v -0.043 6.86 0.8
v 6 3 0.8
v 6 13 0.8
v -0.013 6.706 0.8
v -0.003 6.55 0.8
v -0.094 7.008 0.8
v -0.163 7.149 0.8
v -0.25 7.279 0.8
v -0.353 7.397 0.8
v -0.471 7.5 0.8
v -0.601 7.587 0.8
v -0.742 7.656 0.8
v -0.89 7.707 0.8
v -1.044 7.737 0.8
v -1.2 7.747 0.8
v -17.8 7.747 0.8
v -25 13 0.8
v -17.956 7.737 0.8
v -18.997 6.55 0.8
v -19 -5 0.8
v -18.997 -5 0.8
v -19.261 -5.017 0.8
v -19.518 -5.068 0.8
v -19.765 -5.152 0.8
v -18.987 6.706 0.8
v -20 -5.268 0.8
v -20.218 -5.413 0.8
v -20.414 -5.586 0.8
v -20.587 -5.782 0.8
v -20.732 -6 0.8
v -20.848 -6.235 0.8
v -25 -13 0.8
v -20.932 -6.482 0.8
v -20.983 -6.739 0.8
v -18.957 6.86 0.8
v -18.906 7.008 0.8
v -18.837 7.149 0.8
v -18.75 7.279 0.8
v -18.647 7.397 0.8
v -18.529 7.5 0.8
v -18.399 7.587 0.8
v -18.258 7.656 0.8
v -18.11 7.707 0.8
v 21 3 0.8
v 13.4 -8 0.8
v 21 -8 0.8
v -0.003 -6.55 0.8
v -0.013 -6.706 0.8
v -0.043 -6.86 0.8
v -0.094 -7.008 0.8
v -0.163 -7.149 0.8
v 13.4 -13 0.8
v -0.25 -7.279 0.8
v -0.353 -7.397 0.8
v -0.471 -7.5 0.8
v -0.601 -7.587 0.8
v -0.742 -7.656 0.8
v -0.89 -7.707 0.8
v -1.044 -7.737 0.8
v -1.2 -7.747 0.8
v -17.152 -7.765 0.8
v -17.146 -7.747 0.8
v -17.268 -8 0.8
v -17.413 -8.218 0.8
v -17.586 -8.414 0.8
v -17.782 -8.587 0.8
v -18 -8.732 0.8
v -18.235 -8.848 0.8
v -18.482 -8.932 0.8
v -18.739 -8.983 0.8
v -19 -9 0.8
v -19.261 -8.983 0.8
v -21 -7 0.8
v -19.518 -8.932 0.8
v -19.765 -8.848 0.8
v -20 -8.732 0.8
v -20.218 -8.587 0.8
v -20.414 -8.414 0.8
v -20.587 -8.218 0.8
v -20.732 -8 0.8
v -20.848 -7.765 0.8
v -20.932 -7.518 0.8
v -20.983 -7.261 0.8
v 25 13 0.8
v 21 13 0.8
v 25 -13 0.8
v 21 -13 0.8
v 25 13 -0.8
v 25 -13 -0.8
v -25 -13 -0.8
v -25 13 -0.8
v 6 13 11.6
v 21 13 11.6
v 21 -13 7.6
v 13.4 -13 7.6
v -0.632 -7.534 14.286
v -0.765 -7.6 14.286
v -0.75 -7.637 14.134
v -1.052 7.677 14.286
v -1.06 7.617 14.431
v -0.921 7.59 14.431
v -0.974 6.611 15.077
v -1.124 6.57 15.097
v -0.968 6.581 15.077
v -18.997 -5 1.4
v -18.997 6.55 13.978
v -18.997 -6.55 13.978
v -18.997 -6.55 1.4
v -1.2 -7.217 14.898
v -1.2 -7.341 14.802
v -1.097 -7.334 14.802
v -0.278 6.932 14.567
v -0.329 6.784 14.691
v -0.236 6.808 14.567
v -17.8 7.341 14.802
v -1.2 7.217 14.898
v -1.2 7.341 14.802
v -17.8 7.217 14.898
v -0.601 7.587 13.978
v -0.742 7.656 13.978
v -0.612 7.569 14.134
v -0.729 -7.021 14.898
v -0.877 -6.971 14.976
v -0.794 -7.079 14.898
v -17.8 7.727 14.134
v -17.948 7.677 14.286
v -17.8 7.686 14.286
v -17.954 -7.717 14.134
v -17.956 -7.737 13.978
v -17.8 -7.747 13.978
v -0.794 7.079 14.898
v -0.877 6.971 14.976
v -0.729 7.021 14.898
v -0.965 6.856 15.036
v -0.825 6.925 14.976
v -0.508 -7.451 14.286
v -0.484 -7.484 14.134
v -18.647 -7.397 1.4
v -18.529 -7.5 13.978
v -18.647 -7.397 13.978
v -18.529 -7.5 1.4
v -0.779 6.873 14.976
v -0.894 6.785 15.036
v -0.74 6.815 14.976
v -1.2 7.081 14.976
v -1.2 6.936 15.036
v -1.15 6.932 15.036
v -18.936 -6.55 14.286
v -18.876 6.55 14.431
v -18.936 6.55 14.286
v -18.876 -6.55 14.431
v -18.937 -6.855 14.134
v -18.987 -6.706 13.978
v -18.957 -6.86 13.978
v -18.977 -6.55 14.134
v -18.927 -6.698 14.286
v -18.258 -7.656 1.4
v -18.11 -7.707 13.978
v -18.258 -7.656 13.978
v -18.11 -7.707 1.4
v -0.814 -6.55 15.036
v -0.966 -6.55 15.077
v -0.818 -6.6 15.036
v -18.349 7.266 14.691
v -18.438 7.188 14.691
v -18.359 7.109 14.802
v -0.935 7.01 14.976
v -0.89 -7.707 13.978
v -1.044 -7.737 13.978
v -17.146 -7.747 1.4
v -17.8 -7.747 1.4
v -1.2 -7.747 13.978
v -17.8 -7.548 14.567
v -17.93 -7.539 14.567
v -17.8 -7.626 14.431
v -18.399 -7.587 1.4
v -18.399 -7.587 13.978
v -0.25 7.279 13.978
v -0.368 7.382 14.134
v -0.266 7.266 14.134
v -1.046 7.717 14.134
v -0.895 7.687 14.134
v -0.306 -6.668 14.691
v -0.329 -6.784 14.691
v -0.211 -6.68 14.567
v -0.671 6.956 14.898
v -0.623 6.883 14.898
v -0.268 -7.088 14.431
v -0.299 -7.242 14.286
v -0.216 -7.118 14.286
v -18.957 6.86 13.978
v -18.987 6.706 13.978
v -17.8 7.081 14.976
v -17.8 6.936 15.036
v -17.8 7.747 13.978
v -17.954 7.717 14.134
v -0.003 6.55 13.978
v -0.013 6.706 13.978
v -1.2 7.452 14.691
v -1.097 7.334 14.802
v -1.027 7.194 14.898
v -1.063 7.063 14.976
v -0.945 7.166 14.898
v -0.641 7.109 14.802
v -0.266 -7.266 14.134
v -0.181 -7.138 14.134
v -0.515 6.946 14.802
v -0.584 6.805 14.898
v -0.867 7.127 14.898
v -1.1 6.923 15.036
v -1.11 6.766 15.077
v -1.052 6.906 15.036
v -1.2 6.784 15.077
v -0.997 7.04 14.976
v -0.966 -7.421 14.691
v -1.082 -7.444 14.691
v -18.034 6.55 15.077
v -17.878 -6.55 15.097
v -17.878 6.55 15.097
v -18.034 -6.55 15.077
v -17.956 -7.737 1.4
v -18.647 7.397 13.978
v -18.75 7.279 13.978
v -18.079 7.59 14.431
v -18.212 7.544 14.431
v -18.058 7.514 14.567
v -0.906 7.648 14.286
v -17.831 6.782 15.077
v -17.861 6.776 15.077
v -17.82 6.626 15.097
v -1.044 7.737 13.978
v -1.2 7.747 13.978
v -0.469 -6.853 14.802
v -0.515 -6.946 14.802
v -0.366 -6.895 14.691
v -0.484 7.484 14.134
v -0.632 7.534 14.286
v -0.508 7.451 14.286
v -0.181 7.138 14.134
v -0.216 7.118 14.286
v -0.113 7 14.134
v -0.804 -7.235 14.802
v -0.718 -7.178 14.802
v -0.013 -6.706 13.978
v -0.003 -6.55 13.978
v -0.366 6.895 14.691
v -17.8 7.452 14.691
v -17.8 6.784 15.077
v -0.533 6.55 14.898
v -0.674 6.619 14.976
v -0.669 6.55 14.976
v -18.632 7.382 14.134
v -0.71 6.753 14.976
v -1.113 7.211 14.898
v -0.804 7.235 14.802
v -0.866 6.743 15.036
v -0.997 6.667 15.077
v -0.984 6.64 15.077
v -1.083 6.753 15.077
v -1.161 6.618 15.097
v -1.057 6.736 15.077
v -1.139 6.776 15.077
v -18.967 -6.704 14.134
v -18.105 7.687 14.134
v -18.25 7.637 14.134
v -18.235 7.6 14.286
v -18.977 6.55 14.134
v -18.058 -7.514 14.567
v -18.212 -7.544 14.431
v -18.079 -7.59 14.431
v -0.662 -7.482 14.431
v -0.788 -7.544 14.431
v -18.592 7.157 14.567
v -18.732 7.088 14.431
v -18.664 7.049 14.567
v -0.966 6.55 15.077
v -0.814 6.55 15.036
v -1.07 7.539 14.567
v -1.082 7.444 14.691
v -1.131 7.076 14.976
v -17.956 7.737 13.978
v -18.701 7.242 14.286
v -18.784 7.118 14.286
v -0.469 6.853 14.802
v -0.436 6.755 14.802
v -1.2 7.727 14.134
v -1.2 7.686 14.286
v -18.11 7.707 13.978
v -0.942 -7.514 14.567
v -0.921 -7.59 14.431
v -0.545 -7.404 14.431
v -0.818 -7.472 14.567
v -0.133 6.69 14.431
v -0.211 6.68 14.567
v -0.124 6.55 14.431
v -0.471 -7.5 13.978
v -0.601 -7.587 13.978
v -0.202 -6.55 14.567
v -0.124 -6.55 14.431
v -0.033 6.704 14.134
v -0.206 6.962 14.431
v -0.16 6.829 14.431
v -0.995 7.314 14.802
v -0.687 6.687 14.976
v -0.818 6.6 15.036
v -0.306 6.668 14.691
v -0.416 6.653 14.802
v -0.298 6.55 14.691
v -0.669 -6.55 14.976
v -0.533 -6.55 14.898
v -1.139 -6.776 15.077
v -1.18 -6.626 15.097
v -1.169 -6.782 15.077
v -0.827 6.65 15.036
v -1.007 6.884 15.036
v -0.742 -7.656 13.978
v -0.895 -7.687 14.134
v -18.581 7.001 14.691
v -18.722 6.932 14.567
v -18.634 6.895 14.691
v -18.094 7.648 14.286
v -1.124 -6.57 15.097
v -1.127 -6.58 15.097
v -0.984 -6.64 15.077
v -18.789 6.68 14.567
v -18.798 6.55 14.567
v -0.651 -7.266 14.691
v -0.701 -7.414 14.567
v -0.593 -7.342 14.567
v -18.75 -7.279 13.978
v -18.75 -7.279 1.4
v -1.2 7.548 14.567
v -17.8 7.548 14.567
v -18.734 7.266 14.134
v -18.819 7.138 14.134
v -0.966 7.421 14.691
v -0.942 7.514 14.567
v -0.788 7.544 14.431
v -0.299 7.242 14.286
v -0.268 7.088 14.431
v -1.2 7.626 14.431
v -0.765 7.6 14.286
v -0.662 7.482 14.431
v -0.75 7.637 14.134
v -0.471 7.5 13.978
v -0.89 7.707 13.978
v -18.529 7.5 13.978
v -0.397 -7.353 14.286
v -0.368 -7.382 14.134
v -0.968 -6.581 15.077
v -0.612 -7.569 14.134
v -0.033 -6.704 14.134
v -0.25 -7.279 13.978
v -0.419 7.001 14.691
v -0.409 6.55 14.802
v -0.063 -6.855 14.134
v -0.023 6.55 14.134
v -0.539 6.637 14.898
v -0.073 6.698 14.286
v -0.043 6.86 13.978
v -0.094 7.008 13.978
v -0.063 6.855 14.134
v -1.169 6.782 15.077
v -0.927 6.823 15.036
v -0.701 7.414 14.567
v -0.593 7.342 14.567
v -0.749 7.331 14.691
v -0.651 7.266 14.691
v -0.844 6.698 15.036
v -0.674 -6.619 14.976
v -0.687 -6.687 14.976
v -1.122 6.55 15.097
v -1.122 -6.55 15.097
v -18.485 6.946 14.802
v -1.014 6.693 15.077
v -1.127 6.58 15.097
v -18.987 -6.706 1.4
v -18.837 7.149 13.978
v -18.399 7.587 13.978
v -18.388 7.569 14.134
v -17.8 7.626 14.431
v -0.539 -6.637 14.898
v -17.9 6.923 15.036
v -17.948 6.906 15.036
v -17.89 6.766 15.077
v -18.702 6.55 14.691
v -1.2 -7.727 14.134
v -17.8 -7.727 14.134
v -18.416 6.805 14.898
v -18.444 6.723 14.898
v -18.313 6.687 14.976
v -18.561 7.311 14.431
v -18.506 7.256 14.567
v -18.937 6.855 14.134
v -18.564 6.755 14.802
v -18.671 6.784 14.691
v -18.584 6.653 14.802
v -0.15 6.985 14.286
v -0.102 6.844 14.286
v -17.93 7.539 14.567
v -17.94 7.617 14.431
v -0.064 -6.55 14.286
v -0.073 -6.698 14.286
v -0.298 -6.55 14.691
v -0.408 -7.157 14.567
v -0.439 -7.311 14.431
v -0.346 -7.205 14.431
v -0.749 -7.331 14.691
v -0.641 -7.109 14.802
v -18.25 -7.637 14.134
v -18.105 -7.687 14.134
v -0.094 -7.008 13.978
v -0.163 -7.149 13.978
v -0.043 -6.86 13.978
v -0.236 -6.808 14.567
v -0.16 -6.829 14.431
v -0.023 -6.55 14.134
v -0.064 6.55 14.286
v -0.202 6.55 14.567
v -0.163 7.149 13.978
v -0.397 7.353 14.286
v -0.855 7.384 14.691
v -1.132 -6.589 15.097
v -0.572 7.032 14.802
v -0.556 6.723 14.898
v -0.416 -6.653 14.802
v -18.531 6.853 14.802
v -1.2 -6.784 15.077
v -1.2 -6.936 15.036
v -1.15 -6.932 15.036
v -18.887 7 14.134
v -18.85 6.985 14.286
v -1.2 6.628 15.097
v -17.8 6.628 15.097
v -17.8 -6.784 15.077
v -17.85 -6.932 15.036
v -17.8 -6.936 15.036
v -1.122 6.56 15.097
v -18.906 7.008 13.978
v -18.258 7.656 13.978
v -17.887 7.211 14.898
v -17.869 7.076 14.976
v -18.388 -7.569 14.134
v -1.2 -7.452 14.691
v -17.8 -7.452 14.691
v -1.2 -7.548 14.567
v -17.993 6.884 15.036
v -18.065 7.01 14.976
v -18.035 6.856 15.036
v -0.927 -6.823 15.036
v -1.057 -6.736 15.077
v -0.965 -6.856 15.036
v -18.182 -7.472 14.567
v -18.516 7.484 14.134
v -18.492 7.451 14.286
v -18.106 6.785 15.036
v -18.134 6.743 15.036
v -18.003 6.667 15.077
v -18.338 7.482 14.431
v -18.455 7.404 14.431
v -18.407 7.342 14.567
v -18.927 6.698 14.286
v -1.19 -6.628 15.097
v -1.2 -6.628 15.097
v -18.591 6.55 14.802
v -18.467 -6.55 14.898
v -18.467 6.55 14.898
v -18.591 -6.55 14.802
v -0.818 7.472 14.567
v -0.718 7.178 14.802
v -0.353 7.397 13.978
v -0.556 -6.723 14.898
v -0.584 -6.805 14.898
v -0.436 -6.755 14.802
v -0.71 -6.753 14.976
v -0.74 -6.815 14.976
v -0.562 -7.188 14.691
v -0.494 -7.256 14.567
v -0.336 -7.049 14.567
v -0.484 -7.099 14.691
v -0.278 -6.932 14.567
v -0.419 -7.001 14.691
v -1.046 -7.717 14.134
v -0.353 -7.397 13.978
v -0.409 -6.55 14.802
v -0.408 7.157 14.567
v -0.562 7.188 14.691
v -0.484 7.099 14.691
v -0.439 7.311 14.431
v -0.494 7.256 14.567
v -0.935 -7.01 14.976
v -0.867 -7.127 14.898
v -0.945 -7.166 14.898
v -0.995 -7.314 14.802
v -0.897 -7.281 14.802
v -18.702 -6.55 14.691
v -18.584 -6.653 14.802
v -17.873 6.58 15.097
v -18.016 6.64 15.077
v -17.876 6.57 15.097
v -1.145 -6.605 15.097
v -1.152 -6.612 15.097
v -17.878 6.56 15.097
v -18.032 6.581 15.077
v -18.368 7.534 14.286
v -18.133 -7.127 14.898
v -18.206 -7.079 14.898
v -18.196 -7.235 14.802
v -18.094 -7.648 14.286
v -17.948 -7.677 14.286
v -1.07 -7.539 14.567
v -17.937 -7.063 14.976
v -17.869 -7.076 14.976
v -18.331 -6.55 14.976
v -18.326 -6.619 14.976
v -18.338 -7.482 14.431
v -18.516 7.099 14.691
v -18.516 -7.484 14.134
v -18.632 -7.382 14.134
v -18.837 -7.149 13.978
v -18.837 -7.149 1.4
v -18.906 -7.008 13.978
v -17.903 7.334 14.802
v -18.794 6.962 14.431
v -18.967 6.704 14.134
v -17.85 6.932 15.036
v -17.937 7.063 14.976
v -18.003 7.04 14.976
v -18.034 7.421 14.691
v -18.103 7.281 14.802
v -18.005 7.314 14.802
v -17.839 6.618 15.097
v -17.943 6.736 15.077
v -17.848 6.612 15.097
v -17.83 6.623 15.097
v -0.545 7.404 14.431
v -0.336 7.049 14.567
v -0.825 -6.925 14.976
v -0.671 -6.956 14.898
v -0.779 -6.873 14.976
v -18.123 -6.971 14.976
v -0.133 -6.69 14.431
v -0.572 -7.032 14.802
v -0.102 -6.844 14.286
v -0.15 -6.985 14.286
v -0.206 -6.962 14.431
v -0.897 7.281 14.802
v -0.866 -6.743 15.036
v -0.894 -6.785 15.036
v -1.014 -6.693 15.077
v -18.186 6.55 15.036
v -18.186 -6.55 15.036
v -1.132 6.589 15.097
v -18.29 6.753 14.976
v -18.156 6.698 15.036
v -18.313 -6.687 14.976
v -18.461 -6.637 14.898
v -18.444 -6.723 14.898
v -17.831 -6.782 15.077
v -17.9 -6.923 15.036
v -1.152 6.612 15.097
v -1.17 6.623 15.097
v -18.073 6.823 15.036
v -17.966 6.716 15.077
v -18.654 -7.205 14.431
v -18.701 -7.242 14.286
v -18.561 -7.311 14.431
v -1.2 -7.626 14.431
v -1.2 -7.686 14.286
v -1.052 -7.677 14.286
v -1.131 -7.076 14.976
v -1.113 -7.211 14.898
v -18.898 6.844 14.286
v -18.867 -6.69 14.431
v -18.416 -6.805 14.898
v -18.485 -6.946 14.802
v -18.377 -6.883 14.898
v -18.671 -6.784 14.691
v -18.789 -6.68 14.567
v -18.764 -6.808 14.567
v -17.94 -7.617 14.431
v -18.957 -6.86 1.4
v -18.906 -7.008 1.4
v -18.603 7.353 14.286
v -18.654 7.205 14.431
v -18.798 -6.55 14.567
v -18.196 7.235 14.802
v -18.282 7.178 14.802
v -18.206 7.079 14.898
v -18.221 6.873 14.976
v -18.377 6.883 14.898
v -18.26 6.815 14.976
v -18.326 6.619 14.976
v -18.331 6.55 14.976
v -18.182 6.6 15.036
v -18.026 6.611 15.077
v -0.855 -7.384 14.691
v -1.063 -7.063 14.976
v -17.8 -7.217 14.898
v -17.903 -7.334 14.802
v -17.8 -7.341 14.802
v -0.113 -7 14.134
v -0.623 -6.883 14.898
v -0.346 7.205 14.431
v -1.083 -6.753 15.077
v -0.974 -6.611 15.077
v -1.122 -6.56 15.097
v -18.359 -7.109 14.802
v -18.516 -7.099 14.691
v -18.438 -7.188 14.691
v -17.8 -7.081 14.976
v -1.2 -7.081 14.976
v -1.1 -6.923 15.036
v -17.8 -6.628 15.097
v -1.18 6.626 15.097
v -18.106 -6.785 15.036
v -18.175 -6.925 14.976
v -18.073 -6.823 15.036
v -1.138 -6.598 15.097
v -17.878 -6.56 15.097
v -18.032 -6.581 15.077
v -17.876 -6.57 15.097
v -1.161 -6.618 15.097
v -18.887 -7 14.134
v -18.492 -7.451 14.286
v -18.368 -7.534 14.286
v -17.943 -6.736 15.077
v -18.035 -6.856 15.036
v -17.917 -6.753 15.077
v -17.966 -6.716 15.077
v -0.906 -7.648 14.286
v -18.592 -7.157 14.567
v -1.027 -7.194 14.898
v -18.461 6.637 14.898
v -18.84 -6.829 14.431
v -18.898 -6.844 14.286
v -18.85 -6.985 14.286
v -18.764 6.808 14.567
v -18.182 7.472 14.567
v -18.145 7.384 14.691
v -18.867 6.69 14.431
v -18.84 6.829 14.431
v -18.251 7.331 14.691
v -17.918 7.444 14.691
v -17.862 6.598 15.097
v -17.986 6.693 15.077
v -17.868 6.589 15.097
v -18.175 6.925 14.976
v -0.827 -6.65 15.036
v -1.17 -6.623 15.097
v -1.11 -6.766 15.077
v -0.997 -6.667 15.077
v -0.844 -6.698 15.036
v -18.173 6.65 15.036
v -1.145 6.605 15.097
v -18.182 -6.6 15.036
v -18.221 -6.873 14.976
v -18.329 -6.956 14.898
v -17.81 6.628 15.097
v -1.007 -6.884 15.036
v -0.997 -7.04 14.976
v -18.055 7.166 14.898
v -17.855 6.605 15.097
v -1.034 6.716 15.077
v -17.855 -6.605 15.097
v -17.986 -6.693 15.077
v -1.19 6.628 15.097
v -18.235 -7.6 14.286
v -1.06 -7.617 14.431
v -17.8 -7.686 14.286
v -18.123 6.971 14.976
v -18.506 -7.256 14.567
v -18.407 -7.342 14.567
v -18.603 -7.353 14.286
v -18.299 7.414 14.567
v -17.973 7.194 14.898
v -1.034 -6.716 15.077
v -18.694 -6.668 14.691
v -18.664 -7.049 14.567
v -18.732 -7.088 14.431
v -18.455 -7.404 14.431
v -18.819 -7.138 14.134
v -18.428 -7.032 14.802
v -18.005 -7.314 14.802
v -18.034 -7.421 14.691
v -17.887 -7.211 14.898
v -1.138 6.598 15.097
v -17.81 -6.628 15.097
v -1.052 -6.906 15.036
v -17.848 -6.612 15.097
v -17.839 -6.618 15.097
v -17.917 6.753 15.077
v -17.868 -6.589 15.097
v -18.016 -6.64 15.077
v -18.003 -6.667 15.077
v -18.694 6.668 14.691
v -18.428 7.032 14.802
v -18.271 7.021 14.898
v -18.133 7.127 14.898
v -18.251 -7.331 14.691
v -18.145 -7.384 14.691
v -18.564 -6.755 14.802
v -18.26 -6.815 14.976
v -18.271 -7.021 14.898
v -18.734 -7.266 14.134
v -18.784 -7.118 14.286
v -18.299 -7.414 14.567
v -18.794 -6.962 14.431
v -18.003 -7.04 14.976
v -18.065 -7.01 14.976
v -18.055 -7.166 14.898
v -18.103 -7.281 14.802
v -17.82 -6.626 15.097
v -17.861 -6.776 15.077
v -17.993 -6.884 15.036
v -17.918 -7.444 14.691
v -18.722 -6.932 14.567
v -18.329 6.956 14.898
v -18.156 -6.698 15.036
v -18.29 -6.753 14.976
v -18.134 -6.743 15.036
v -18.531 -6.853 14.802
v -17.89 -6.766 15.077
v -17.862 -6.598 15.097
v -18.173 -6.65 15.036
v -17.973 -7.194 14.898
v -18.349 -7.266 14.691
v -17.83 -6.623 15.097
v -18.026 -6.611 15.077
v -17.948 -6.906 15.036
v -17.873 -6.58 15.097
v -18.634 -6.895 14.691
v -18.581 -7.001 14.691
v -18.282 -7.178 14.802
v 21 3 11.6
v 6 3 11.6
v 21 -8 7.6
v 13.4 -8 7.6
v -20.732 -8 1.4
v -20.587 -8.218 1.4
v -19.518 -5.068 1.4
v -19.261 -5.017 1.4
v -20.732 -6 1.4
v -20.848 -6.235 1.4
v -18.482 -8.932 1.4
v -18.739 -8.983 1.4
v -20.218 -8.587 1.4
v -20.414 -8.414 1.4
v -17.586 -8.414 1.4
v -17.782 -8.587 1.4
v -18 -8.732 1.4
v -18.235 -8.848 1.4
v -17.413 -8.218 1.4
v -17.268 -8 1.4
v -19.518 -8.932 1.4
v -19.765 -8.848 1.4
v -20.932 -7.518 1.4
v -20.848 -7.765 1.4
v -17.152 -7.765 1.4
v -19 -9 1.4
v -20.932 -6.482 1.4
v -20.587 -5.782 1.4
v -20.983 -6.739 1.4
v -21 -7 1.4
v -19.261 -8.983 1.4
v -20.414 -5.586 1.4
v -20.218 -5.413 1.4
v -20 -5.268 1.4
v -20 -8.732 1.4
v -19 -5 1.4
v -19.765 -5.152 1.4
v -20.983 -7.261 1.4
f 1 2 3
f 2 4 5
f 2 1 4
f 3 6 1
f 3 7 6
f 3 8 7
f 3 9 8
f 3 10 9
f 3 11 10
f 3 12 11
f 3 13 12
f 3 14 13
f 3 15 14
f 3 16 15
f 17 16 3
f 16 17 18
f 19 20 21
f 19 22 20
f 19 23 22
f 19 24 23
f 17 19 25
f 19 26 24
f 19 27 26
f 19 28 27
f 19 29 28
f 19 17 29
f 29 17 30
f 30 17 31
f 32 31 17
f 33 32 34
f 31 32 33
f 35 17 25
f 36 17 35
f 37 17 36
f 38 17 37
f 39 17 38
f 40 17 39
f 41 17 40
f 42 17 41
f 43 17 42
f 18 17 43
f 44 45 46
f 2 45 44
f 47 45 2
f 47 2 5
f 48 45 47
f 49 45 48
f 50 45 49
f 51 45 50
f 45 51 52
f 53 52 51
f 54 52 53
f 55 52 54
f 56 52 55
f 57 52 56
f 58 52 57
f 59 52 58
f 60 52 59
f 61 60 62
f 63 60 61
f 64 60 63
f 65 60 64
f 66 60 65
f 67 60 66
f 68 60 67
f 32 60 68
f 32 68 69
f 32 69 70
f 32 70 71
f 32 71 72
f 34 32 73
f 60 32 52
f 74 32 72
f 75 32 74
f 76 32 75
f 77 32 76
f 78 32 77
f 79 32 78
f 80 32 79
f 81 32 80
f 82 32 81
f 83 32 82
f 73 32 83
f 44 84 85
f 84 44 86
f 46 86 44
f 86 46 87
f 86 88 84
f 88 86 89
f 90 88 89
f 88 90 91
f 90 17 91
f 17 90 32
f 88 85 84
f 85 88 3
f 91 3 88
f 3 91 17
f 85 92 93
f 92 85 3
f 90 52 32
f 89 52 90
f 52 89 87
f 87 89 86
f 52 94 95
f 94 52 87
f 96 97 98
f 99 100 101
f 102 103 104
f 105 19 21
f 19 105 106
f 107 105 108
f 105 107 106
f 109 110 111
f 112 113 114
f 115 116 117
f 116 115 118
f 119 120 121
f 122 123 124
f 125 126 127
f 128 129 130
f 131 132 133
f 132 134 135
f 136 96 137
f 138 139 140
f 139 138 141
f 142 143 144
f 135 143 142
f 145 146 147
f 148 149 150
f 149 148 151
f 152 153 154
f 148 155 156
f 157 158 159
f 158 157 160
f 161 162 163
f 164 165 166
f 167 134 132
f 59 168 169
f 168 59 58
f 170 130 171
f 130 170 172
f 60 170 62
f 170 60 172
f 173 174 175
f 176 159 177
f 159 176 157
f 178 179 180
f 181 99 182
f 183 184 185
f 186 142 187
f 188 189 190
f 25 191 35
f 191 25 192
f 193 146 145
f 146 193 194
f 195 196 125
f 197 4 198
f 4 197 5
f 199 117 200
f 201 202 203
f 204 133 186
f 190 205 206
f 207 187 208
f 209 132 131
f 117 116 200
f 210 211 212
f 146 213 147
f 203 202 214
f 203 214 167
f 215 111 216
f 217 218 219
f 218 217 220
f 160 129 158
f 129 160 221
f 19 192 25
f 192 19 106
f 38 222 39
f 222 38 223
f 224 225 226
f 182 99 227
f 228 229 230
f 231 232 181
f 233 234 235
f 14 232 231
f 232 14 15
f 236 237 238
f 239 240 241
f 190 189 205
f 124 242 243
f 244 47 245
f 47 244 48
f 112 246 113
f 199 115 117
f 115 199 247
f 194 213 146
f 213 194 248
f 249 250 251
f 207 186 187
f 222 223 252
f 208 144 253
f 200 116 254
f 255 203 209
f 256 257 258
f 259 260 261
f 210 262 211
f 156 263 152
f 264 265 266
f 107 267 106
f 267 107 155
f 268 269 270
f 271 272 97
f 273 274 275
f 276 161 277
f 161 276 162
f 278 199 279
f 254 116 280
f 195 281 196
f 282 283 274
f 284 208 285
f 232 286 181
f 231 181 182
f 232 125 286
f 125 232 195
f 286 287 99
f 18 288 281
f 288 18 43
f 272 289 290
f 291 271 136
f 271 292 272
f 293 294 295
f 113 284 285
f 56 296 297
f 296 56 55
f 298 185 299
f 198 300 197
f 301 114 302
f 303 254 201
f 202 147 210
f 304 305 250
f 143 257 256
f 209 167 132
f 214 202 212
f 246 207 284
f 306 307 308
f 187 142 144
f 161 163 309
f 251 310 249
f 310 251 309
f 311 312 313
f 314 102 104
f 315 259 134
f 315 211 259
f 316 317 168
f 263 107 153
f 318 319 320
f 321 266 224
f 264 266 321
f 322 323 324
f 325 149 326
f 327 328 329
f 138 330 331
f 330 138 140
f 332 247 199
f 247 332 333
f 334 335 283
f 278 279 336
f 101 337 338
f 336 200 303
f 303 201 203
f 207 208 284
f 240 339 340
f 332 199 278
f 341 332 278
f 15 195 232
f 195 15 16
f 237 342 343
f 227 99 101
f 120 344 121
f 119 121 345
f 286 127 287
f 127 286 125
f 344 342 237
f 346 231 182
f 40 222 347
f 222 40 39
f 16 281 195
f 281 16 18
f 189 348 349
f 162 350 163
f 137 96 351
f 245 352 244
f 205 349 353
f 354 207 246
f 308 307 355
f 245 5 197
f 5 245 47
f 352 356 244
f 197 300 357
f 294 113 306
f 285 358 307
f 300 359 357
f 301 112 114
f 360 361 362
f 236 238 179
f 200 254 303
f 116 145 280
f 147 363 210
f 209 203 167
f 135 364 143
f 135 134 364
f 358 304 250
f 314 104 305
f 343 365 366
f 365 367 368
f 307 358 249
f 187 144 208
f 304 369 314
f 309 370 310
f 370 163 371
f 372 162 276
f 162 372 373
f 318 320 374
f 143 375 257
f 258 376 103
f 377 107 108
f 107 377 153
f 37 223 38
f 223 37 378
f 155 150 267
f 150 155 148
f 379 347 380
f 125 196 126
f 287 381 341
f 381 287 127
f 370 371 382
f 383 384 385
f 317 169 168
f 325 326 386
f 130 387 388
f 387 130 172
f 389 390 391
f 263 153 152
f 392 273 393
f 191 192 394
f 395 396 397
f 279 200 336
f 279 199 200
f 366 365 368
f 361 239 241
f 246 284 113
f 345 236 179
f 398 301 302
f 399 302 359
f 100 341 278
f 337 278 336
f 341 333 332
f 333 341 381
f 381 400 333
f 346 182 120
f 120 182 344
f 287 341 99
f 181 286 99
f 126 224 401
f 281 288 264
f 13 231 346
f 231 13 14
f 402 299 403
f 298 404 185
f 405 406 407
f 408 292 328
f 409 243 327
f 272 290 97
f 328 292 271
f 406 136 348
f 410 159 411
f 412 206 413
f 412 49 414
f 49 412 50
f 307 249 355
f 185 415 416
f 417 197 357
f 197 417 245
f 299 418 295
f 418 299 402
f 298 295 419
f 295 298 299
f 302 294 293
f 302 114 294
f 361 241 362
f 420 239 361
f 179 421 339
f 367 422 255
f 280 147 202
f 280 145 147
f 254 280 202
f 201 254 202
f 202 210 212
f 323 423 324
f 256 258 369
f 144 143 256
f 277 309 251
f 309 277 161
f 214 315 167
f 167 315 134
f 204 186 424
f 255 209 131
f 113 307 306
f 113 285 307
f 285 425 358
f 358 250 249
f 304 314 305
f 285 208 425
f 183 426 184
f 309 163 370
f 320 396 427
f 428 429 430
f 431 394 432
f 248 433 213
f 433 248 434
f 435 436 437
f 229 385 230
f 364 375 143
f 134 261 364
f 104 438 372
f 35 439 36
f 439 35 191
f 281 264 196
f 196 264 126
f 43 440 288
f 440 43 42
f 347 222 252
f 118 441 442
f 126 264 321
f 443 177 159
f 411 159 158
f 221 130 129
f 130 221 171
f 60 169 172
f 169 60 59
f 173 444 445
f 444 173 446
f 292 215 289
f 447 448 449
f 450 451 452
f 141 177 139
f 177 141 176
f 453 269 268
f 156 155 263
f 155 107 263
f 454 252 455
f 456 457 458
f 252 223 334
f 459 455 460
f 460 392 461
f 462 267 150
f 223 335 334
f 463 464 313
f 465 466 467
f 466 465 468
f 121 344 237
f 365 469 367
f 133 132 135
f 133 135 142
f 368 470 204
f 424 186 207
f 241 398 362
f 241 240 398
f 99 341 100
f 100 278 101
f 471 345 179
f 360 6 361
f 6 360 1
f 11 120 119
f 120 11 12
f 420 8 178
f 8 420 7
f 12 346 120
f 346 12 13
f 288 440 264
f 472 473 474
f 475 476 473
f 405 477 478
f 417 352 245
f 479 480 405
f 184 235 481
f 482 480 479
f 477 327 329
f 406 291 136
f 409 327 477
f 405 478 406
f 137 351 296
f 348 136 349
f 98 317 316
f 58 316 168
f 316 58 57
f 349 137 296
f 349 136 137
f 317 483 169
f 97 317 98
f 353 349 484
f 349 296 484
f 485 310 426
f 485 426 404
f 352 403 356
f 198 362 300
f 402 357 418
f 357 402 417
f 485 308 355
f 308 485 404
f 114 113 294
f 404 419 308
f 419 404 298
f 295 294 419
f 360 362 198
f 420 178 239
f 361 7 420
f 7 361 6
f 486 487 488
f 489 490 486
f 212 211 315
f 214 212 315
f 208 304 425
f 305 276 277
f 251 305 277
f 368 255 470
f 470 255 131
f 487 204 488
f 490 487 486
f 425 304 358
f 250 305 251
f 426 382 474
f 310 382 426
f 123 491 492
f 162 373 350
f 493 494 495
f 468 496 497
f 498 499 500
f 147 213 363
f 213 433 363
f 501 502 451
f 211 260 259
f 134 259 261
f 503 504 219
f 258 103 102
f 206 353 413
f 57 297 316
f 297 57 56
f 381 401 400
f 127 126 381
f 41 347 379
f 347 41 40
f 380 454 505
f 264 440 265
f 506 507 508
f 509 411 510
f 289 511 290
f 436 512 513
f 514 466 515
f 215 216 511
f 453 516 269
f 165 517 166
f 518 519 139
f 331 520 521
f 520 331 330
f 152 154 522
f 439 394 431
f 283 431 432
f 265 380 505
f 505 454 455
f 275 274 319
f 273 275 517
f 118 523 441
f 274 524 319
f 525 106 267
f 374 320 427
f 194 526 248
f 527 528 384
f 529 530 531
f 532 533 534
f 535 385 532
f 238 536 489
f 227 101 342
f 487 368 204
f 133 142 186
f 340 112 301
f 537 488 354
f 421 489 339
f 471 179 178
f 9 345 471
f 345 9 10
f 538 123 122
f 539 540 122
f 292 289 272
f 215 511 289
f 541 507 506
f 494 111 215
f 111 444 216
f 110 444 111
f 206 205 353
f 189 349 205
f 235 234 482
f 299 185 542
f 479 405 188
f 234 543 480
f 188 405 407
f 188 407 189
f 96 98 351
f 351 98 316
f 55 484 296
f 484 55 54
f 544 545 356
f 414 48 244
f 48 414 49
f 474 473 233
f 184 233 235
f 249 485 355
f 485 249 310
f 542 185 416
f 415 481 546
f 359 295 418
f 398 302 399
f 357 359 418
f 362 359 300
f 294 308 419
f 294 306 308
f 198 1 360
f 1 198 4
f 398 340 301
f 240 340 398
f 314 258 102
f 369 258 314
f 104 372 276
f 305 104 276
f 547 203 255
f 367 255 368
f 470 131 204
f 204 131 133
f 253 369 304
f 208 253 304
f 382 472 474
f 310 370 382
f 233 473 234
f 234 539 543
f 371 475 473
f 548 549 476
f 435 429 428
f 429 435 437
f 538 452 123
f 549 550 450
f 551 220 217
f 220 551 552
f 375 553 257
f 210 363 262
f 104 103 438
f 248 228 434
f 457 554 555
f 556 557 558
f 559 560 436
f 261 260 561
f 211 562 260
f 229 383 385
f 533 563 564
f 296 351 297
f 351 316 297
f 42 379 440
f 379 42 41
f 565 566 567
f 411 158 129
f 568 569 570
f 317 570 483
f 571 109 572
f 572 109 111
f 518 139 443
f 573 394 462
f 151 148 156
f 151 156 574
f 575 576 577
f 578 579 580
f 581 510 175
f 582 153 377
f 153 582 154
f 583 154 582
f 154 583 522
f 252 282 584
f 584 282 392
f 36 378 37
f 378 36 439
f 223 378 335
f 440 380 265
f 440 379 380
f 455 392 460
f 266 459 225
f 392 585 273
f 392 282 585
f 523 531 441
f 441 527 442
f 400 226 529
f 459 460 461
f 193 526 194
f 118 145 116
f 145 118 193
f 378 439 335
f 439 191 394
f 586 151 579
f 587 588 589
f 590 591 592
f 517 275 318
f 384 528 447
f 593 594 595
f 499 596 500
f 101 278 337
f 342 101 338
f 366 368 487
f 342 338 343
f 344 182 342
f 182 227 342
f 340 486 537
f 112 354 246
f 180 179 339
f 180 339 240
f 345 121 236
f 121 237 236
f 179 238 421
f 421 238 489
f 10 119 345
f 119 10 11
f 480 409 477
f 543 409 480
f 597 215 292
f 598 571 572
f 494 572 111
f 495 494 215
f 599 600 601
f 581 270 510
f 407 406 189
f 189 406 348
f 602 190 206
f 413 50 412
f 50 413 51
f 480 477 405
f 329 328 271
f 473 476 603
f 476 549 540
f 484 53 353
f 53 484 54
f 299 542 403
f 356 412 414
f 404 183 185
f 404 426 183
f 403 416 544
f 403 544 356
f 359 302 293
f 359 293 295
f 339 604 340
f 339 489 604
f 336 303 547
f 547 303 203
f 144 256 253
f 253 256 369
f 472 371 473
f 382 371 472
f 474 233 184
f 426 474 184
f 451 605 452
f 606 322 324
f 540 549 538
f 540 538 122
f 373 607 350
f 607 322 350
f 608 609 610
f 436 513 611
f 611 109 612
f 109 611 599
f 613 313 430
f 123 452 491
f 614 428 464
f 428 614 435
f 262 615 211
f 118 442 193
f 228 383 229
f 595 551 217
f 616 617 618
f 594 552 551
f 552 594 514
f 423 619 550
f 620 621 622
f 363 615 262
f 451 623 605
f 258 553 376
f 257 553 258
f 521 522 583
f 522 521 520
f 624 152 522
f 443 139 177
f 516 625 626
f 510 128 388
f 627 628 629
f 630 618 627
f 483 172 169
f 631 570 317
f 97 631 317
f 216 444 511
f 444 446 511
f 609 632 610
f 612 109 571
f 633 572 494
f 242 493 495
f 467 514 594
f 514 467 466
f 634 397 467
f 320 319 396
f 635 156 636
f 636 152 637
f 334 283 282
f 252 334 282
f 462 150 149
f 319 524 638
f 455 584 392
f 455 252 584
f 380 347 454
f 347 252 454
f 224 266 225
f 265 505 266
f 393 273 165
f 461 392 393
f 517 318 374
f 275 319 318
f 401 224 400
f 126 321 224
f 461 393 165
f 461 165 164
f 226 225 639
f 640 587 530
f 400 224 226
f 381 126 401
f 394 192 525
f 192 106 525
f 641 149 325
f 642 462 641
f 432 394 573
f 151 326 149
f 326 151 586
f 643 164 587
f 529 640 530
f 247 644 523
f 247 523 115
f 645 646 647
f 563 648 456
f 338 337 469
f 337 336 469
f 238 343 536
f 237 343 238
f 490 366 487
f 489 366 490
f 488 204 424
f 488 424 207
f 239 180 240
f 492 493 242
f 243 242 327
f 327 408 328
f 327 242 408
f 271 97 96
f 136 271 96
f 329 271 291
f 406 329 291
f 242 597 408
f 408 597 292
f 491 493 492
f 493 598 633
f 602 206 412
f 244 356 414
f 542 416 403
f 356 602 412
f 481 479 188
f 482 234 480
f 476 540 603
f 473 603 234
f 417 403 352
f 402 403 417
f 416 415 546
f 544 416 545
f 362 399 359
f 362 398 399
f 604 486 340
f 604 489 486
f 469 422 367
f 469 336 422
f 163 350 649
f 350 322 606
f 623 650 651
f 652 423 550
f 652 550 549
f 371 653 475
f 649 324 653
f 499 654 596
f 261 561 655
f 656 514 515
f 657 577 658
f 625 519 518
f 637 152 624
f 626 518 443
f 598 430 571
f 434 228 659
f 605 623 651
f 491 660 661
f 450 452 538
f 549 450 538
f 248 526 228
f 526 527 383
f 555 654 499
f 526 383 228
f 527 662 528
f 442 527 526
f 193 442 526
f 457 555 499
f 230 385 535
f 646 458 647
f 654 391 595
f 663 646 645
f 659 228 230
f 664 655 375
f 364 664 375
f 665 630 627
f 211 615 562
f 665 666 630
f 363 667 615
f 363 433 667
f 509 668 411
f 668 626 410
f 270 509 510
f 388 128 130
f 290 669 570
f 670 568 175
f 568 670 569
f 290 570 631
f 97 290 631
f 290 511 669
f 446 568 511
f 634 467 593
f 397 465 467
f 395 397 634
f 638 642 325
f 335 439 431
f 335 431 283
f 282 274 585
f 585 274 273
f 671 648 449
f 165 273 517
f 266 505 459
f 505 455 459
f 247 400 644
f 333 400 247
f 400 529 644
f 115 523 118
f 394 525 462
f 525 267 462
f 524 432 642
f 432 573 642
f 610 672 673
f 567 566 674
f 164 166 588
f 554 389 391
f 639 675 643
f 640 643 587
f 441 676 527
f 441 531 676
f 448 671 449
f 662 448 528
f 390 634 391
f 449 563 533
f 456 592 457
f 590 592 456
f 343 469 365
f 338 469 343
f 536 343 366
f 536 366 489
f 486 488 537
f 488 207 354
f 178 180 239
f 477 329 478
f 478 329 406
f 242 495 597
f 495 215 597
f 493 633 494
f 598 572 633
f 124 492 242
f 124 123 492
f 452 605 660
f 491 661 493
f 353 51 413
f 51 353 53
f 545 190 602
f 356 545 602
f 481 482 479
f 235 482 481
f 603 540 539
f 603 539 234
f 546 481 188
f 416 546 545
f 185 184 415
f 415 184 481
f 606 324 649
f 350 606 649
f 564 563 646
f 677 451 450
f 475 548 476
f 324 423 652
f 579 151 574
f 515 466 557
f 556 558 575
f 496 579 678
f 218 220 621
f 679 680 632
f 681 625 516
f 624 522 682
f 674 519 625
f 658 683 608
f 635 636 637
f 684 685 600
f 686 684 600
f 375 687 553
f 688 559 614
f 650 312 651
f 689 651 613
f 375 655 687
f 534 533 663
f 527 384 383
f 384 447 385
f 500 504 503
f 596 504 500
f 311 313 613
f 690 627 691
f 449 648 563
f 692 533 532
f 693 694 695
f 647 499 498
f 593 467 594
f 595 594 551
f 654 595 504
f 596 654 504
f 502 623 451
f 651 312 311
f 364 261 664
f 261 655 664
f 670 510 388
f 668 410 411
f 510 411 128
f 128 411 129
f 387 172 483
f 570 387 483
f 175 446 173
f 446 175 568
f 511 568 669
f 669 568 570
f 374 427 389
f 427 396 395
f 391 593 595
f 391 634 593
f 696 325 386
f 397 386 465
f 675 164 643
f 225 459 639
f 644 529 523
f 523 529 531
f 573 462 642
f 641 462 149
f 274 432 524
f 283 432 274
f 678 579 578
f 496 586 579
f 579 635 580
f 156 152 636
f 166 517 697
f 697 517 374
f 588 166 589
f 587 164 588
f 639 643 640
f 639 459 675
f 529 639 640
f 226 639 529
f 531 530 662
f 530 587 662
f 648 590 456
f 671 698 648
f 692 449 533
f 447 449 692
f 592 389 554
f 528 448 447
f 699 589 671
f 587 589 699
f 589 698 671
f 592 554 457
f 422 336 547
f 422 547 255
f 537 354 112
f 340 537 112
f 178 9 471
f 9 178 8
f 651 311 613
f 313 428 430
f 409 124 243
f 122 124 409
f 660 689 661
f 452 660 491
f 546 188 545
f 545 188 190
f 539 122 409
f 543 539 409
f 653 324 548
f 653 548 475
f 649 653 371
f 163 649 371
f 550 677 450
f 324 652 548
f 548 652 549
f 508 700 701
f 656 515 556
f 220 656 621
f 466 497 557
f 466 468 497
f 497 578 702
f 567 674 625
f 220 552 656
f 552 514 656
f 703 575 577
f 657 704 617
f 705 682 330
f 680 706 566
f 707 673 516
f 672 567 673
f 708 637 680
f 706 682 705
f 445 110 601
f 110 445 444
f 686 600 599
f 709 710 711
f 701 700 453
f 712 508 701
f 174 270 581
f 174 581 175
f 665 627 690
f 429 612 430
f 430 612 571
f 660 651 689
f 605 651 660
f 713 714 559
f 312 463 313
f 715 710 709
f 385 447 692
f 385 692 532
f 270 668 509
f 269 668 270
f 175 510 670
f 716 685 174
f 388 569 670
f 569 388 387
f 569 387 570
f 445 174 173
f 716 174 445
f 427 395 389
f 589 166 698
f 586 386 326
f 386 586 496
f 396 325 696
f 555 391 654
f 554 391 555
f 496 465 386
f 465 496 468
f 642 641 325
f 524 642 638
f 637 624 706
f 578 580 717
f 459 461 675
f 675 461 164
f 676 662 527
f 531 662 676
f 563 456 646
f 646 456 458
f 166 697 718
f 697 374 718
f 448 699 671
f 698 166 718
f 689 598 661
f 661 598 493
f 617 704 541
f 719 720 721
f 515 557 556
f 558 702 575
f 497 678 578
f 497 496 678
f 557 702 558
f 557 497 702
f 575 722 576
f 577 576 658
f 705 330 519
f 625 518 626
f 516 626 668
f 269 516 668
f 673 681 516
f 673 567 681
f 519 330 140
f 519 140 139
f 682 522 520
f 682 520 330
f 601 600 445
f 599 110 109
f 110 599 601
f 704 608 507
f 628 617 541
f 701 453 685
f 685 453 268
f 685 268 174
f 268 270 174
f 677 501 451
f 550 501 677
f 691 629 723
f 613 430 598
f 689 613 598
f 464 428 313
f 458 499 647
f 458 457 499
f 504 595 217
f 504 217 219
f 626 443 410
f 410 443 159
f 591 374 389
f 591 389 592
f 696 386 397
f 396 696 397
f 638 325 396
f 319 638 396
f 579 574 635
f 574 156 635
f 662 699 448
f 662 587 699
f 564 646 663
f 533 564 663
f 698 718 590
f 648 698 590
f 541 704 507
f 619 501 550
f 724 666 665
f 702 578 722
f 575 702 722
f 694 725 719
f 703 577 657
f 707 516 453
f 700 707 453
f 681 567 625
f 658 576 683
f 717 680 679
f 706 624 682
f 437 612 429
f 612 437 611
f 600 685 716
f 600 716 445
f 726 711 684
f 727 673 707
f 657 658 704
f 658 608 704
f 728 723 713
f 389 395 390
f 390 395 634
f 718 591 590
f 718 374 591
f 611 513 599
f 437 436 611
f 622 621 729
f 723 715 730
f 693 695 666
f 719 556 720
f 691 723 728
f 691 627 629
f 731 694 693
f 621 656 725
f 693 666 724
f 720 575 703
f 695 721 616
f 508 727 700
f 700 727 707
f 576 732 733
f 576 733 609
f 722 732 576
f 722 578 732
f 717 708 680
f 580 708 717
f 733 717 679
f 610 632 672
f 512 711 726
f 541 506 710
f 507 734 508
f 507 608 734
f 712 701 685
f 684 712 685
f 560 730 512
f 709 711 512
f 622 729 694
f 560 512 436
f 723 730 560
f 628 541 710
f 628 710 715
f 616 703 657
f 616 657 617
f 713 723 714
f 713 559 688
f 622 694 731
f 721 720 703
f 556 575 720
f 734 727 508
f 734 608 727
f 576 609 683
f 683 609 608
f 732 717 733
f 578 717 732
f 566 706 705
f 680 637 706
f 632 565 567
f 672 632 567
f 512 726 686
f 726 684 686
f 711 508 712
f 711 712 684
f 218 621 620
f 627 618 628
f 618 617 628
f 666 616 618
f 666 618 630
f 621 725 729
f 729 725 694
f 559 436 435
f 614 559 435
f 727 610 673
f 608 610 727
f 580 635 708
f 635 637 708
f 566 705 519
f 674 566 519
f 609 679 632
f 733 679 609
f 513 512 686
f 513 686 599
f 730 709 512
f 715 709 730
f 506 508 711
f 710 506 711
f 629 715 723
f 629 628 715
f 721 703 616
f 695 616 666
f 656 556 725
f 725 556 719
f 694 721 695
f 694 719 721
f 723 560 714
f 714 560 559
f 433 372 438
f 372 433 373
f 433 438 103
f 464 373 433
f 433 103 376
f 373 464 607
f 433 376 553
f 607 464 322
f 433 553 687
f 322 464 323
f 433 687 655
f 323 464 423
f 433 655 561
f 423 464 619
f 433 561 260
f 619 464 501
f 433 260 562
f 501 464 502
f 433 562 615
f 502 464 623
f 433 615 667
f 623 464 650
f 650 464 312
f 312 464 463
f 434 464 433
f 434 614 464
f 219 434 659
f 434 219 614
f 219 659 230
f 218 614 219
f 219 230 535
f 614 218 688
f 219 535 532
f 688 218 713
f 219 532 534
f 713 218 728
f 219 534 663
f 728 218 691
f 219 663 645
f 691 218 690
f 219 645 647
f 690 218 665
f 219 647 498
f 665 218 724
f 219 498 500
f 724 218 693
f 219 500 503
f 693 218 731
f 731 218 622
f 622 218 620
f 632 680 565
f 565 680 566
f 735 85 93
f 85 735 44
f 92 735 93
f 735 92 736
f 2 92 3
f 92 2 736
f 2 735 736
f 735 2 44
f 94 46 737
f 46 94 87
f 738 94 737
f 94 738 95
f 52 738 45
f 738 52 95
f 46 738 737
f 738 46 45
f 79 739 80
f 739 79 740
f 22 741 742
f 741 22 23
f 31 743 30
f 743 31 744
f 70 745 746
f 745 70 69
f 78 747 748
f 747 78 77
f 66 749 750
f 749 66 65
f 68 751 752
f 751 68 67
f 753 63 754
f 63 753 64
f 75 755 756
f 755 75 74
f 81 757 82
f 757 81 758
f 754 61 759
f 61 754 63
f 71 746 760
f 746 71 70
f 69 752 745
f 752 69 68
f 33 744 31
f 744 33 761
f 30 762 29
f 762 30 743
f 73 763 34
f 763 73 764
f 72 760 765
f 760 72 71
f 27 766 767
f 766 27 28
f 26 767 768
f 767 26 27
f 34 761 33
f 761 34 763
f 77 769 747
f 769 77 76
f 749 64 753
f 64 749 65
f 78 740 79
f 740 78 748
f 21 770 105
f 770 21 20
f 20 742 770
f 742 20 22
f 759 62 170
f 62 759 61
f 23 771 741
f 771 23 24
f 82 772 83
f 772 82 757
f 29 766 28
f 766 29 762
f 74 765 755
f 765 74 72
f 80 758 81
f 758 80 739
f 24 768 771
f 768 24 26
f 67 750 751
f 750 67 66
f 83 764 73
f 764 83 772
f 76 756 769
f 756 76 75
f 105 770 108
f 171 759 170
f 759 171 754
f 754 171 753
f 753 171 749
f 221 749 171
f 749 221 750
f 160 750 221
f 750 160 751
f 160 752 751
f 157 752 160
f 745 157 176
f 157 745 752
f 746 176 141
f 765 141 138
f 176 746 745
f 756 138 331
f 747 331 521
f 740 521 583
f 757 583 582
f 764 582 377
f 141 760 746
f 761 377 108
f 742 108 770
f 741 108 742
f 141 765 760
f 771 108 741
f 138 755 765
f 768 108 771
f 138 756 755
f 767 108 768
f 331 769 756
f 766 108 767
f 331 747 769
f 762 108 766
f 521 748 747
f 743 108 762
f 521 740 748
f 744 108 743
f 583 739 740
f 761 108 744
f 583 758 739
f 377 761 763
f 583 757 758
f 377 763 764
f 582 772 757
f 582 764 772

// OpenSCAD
$fn = 48;

// Relay module overall PCB
pcb_length = 50.0;
pcb_width  = 26.0;
pcb_thick  = 1.6;

// Overlap to guarantee one connected solid (1–2mm as required)
overlap = 1.2;

// ---------- Helpers ----------
module rounded_box(size=[10,10,10], r=1, center=true) {
    minkowski() {
        cube([size[0]-2*r, size[1]-2*r, size[2]-2*r], center=center);
        sphere(r=r);
    }
}

// ---------- Parts ----------
module pcb() {
    cube([pcb_length, pcb_width, pcb_thick], center=true);
}

module relay_block() {
    // Typical Songle-style relay body (approx)
    relay_l = 19.0;
    relay_w = 15.5;
    relay_h = 15.5;
    relay_r = 1.2;

    // Place on top of PCB, near one end
    x_pos = -pcb_length/2 + 6.0 + relay_l/2;

    // Ensure physical intersection with PCB by sinking into it by 'overlap'
    z_pos = pcb_thick/2 + relay_h/2 - overlap;

    translate([x_pos, 0, z_pos])
        rounded_box([relay_l, relay_w, relay_h], r=relay_r, center=true);
}

module screw_terminal_3p() {
    // 3-position screw terminal block (approx)
    term_l = 15.0;
    term_w = 10.0;
    term_h = 12.0;

    // Along one long edge, near opposite end from relay
    x_pos = pcb_length/2 - 4.0 - term_l/2;
    y_pos = pcb_width/2 - term_w/2;

    // Sink into PCB for guaranteed attachment
    z_pos = pcb_thick/2 + term_h/2 - overlap;

    translate([x_pos, y_pos, z_pos])
        cube([term_l, term_w, term_h], center=true);
}

module pin_header_3() {
    // 3-pin header (approx)
    hdr_l = 7.6;   // 3 * 2.54
    hdr_w = 5.0;
    hdr_h = 8.0;

    // Along opposite long edge, near same end as terminal
    x_pos = pcb_length/2 - 4.0 - hdr_l/2;
    y_pos = -pcb_width/2 + hdr_w/2;

    // Sink into PCB for guaranteed attachment
    z_pos = pcb_thick/2 + hdr_h/2 - overlap;

    translate([x_pos, y_pos, z_pos])
        cube([hdr_l, hdr_w, hdr_h], center=true);
}

module led_bump() {
    // Small indicator LED lens bump (approx)
    led_r = 2.0;
    led_h = 1.8;

    x_pos = -pcb_length/2 + 6.0;
    y_pos = -pcb_width/2 + 6.0;

    // Sink into PCB for guaranteed attachment
    z_pos = pcb_thick/2 + led_h/2 - overlap;

    translate([x_pos, y_pos, z_pos])
        cylinder(h=led_h, r=led_r, center=true);
}

module standoff_bumps() {
    // Small bumps to suggest mounting holes (kept solid, not holes)
    bump_r = 2.2;
    bump_h = 1.2;

    // Sink into PCB for guaranteed attachment
    z_pos = pcb_thick/2 + bump_h/2 - overlap;

    for (sx = [-1, 1], sy = [-1, 1]) {
        x_pos = sx*(pcb_length/2 - 4.0);
        y_pos = sy*(pcb_width/2  - 4.0);
        translate([x_pos, y_pos, z_pos])
            cylinder(h=bump_h, r=bump_r, center=true);
    }
}

// --- FIX: add an explicit connector "foot" under the relay to eliminate any chance of a gap ---
// This guarantees the teal relay block is physically merged to the PCB even if rounding/minkowski
// causes a tiny separation in some slicers/viewers.
module relay_connector_foot() {
    relay_l = 19.0;
    relay_w = 15.5;

    // Slightly smaller than relay footprint, and extends into PCB by overlap
    foot_l = relay_l - 2.0;
    foot_w = relay_w - 2.0;

    // Make the foot span from slightly above PCB top down into PCB by overlap
    // Total height ensures intersection with both PCB and relay body.
    foot_h = overlap + 1.0; // within 1–2mm overlap requirement

    x_pos = -pcb_length/2 + 6.0 + relay_l/2;
    y_pos = 0;

    // Center the foot so its bottom goes into PCB by overlap
    // Bottom = (pcb_thick/2) - overlap
    // So center z = (pcb_thick/2 - overlap) + foot_h/2
    z_pos = (pcb_thick/2 - overlap) + foot_h/2;

    translate([x_pos, y_pos, z_pos])
        cube([foot_l, foot_w, foot_h], center=true);
}

// ---------- Assembly (ONE connected solid) ----------
union() {
    pcb();

    // Ensure relay is attached with a guaranteed overlapping connector
    relay_connector_foot();
    relay_block();

    screw_terminal_3p();
    pin_header_3();
    led_bump();
    standoff_bumps();
}
